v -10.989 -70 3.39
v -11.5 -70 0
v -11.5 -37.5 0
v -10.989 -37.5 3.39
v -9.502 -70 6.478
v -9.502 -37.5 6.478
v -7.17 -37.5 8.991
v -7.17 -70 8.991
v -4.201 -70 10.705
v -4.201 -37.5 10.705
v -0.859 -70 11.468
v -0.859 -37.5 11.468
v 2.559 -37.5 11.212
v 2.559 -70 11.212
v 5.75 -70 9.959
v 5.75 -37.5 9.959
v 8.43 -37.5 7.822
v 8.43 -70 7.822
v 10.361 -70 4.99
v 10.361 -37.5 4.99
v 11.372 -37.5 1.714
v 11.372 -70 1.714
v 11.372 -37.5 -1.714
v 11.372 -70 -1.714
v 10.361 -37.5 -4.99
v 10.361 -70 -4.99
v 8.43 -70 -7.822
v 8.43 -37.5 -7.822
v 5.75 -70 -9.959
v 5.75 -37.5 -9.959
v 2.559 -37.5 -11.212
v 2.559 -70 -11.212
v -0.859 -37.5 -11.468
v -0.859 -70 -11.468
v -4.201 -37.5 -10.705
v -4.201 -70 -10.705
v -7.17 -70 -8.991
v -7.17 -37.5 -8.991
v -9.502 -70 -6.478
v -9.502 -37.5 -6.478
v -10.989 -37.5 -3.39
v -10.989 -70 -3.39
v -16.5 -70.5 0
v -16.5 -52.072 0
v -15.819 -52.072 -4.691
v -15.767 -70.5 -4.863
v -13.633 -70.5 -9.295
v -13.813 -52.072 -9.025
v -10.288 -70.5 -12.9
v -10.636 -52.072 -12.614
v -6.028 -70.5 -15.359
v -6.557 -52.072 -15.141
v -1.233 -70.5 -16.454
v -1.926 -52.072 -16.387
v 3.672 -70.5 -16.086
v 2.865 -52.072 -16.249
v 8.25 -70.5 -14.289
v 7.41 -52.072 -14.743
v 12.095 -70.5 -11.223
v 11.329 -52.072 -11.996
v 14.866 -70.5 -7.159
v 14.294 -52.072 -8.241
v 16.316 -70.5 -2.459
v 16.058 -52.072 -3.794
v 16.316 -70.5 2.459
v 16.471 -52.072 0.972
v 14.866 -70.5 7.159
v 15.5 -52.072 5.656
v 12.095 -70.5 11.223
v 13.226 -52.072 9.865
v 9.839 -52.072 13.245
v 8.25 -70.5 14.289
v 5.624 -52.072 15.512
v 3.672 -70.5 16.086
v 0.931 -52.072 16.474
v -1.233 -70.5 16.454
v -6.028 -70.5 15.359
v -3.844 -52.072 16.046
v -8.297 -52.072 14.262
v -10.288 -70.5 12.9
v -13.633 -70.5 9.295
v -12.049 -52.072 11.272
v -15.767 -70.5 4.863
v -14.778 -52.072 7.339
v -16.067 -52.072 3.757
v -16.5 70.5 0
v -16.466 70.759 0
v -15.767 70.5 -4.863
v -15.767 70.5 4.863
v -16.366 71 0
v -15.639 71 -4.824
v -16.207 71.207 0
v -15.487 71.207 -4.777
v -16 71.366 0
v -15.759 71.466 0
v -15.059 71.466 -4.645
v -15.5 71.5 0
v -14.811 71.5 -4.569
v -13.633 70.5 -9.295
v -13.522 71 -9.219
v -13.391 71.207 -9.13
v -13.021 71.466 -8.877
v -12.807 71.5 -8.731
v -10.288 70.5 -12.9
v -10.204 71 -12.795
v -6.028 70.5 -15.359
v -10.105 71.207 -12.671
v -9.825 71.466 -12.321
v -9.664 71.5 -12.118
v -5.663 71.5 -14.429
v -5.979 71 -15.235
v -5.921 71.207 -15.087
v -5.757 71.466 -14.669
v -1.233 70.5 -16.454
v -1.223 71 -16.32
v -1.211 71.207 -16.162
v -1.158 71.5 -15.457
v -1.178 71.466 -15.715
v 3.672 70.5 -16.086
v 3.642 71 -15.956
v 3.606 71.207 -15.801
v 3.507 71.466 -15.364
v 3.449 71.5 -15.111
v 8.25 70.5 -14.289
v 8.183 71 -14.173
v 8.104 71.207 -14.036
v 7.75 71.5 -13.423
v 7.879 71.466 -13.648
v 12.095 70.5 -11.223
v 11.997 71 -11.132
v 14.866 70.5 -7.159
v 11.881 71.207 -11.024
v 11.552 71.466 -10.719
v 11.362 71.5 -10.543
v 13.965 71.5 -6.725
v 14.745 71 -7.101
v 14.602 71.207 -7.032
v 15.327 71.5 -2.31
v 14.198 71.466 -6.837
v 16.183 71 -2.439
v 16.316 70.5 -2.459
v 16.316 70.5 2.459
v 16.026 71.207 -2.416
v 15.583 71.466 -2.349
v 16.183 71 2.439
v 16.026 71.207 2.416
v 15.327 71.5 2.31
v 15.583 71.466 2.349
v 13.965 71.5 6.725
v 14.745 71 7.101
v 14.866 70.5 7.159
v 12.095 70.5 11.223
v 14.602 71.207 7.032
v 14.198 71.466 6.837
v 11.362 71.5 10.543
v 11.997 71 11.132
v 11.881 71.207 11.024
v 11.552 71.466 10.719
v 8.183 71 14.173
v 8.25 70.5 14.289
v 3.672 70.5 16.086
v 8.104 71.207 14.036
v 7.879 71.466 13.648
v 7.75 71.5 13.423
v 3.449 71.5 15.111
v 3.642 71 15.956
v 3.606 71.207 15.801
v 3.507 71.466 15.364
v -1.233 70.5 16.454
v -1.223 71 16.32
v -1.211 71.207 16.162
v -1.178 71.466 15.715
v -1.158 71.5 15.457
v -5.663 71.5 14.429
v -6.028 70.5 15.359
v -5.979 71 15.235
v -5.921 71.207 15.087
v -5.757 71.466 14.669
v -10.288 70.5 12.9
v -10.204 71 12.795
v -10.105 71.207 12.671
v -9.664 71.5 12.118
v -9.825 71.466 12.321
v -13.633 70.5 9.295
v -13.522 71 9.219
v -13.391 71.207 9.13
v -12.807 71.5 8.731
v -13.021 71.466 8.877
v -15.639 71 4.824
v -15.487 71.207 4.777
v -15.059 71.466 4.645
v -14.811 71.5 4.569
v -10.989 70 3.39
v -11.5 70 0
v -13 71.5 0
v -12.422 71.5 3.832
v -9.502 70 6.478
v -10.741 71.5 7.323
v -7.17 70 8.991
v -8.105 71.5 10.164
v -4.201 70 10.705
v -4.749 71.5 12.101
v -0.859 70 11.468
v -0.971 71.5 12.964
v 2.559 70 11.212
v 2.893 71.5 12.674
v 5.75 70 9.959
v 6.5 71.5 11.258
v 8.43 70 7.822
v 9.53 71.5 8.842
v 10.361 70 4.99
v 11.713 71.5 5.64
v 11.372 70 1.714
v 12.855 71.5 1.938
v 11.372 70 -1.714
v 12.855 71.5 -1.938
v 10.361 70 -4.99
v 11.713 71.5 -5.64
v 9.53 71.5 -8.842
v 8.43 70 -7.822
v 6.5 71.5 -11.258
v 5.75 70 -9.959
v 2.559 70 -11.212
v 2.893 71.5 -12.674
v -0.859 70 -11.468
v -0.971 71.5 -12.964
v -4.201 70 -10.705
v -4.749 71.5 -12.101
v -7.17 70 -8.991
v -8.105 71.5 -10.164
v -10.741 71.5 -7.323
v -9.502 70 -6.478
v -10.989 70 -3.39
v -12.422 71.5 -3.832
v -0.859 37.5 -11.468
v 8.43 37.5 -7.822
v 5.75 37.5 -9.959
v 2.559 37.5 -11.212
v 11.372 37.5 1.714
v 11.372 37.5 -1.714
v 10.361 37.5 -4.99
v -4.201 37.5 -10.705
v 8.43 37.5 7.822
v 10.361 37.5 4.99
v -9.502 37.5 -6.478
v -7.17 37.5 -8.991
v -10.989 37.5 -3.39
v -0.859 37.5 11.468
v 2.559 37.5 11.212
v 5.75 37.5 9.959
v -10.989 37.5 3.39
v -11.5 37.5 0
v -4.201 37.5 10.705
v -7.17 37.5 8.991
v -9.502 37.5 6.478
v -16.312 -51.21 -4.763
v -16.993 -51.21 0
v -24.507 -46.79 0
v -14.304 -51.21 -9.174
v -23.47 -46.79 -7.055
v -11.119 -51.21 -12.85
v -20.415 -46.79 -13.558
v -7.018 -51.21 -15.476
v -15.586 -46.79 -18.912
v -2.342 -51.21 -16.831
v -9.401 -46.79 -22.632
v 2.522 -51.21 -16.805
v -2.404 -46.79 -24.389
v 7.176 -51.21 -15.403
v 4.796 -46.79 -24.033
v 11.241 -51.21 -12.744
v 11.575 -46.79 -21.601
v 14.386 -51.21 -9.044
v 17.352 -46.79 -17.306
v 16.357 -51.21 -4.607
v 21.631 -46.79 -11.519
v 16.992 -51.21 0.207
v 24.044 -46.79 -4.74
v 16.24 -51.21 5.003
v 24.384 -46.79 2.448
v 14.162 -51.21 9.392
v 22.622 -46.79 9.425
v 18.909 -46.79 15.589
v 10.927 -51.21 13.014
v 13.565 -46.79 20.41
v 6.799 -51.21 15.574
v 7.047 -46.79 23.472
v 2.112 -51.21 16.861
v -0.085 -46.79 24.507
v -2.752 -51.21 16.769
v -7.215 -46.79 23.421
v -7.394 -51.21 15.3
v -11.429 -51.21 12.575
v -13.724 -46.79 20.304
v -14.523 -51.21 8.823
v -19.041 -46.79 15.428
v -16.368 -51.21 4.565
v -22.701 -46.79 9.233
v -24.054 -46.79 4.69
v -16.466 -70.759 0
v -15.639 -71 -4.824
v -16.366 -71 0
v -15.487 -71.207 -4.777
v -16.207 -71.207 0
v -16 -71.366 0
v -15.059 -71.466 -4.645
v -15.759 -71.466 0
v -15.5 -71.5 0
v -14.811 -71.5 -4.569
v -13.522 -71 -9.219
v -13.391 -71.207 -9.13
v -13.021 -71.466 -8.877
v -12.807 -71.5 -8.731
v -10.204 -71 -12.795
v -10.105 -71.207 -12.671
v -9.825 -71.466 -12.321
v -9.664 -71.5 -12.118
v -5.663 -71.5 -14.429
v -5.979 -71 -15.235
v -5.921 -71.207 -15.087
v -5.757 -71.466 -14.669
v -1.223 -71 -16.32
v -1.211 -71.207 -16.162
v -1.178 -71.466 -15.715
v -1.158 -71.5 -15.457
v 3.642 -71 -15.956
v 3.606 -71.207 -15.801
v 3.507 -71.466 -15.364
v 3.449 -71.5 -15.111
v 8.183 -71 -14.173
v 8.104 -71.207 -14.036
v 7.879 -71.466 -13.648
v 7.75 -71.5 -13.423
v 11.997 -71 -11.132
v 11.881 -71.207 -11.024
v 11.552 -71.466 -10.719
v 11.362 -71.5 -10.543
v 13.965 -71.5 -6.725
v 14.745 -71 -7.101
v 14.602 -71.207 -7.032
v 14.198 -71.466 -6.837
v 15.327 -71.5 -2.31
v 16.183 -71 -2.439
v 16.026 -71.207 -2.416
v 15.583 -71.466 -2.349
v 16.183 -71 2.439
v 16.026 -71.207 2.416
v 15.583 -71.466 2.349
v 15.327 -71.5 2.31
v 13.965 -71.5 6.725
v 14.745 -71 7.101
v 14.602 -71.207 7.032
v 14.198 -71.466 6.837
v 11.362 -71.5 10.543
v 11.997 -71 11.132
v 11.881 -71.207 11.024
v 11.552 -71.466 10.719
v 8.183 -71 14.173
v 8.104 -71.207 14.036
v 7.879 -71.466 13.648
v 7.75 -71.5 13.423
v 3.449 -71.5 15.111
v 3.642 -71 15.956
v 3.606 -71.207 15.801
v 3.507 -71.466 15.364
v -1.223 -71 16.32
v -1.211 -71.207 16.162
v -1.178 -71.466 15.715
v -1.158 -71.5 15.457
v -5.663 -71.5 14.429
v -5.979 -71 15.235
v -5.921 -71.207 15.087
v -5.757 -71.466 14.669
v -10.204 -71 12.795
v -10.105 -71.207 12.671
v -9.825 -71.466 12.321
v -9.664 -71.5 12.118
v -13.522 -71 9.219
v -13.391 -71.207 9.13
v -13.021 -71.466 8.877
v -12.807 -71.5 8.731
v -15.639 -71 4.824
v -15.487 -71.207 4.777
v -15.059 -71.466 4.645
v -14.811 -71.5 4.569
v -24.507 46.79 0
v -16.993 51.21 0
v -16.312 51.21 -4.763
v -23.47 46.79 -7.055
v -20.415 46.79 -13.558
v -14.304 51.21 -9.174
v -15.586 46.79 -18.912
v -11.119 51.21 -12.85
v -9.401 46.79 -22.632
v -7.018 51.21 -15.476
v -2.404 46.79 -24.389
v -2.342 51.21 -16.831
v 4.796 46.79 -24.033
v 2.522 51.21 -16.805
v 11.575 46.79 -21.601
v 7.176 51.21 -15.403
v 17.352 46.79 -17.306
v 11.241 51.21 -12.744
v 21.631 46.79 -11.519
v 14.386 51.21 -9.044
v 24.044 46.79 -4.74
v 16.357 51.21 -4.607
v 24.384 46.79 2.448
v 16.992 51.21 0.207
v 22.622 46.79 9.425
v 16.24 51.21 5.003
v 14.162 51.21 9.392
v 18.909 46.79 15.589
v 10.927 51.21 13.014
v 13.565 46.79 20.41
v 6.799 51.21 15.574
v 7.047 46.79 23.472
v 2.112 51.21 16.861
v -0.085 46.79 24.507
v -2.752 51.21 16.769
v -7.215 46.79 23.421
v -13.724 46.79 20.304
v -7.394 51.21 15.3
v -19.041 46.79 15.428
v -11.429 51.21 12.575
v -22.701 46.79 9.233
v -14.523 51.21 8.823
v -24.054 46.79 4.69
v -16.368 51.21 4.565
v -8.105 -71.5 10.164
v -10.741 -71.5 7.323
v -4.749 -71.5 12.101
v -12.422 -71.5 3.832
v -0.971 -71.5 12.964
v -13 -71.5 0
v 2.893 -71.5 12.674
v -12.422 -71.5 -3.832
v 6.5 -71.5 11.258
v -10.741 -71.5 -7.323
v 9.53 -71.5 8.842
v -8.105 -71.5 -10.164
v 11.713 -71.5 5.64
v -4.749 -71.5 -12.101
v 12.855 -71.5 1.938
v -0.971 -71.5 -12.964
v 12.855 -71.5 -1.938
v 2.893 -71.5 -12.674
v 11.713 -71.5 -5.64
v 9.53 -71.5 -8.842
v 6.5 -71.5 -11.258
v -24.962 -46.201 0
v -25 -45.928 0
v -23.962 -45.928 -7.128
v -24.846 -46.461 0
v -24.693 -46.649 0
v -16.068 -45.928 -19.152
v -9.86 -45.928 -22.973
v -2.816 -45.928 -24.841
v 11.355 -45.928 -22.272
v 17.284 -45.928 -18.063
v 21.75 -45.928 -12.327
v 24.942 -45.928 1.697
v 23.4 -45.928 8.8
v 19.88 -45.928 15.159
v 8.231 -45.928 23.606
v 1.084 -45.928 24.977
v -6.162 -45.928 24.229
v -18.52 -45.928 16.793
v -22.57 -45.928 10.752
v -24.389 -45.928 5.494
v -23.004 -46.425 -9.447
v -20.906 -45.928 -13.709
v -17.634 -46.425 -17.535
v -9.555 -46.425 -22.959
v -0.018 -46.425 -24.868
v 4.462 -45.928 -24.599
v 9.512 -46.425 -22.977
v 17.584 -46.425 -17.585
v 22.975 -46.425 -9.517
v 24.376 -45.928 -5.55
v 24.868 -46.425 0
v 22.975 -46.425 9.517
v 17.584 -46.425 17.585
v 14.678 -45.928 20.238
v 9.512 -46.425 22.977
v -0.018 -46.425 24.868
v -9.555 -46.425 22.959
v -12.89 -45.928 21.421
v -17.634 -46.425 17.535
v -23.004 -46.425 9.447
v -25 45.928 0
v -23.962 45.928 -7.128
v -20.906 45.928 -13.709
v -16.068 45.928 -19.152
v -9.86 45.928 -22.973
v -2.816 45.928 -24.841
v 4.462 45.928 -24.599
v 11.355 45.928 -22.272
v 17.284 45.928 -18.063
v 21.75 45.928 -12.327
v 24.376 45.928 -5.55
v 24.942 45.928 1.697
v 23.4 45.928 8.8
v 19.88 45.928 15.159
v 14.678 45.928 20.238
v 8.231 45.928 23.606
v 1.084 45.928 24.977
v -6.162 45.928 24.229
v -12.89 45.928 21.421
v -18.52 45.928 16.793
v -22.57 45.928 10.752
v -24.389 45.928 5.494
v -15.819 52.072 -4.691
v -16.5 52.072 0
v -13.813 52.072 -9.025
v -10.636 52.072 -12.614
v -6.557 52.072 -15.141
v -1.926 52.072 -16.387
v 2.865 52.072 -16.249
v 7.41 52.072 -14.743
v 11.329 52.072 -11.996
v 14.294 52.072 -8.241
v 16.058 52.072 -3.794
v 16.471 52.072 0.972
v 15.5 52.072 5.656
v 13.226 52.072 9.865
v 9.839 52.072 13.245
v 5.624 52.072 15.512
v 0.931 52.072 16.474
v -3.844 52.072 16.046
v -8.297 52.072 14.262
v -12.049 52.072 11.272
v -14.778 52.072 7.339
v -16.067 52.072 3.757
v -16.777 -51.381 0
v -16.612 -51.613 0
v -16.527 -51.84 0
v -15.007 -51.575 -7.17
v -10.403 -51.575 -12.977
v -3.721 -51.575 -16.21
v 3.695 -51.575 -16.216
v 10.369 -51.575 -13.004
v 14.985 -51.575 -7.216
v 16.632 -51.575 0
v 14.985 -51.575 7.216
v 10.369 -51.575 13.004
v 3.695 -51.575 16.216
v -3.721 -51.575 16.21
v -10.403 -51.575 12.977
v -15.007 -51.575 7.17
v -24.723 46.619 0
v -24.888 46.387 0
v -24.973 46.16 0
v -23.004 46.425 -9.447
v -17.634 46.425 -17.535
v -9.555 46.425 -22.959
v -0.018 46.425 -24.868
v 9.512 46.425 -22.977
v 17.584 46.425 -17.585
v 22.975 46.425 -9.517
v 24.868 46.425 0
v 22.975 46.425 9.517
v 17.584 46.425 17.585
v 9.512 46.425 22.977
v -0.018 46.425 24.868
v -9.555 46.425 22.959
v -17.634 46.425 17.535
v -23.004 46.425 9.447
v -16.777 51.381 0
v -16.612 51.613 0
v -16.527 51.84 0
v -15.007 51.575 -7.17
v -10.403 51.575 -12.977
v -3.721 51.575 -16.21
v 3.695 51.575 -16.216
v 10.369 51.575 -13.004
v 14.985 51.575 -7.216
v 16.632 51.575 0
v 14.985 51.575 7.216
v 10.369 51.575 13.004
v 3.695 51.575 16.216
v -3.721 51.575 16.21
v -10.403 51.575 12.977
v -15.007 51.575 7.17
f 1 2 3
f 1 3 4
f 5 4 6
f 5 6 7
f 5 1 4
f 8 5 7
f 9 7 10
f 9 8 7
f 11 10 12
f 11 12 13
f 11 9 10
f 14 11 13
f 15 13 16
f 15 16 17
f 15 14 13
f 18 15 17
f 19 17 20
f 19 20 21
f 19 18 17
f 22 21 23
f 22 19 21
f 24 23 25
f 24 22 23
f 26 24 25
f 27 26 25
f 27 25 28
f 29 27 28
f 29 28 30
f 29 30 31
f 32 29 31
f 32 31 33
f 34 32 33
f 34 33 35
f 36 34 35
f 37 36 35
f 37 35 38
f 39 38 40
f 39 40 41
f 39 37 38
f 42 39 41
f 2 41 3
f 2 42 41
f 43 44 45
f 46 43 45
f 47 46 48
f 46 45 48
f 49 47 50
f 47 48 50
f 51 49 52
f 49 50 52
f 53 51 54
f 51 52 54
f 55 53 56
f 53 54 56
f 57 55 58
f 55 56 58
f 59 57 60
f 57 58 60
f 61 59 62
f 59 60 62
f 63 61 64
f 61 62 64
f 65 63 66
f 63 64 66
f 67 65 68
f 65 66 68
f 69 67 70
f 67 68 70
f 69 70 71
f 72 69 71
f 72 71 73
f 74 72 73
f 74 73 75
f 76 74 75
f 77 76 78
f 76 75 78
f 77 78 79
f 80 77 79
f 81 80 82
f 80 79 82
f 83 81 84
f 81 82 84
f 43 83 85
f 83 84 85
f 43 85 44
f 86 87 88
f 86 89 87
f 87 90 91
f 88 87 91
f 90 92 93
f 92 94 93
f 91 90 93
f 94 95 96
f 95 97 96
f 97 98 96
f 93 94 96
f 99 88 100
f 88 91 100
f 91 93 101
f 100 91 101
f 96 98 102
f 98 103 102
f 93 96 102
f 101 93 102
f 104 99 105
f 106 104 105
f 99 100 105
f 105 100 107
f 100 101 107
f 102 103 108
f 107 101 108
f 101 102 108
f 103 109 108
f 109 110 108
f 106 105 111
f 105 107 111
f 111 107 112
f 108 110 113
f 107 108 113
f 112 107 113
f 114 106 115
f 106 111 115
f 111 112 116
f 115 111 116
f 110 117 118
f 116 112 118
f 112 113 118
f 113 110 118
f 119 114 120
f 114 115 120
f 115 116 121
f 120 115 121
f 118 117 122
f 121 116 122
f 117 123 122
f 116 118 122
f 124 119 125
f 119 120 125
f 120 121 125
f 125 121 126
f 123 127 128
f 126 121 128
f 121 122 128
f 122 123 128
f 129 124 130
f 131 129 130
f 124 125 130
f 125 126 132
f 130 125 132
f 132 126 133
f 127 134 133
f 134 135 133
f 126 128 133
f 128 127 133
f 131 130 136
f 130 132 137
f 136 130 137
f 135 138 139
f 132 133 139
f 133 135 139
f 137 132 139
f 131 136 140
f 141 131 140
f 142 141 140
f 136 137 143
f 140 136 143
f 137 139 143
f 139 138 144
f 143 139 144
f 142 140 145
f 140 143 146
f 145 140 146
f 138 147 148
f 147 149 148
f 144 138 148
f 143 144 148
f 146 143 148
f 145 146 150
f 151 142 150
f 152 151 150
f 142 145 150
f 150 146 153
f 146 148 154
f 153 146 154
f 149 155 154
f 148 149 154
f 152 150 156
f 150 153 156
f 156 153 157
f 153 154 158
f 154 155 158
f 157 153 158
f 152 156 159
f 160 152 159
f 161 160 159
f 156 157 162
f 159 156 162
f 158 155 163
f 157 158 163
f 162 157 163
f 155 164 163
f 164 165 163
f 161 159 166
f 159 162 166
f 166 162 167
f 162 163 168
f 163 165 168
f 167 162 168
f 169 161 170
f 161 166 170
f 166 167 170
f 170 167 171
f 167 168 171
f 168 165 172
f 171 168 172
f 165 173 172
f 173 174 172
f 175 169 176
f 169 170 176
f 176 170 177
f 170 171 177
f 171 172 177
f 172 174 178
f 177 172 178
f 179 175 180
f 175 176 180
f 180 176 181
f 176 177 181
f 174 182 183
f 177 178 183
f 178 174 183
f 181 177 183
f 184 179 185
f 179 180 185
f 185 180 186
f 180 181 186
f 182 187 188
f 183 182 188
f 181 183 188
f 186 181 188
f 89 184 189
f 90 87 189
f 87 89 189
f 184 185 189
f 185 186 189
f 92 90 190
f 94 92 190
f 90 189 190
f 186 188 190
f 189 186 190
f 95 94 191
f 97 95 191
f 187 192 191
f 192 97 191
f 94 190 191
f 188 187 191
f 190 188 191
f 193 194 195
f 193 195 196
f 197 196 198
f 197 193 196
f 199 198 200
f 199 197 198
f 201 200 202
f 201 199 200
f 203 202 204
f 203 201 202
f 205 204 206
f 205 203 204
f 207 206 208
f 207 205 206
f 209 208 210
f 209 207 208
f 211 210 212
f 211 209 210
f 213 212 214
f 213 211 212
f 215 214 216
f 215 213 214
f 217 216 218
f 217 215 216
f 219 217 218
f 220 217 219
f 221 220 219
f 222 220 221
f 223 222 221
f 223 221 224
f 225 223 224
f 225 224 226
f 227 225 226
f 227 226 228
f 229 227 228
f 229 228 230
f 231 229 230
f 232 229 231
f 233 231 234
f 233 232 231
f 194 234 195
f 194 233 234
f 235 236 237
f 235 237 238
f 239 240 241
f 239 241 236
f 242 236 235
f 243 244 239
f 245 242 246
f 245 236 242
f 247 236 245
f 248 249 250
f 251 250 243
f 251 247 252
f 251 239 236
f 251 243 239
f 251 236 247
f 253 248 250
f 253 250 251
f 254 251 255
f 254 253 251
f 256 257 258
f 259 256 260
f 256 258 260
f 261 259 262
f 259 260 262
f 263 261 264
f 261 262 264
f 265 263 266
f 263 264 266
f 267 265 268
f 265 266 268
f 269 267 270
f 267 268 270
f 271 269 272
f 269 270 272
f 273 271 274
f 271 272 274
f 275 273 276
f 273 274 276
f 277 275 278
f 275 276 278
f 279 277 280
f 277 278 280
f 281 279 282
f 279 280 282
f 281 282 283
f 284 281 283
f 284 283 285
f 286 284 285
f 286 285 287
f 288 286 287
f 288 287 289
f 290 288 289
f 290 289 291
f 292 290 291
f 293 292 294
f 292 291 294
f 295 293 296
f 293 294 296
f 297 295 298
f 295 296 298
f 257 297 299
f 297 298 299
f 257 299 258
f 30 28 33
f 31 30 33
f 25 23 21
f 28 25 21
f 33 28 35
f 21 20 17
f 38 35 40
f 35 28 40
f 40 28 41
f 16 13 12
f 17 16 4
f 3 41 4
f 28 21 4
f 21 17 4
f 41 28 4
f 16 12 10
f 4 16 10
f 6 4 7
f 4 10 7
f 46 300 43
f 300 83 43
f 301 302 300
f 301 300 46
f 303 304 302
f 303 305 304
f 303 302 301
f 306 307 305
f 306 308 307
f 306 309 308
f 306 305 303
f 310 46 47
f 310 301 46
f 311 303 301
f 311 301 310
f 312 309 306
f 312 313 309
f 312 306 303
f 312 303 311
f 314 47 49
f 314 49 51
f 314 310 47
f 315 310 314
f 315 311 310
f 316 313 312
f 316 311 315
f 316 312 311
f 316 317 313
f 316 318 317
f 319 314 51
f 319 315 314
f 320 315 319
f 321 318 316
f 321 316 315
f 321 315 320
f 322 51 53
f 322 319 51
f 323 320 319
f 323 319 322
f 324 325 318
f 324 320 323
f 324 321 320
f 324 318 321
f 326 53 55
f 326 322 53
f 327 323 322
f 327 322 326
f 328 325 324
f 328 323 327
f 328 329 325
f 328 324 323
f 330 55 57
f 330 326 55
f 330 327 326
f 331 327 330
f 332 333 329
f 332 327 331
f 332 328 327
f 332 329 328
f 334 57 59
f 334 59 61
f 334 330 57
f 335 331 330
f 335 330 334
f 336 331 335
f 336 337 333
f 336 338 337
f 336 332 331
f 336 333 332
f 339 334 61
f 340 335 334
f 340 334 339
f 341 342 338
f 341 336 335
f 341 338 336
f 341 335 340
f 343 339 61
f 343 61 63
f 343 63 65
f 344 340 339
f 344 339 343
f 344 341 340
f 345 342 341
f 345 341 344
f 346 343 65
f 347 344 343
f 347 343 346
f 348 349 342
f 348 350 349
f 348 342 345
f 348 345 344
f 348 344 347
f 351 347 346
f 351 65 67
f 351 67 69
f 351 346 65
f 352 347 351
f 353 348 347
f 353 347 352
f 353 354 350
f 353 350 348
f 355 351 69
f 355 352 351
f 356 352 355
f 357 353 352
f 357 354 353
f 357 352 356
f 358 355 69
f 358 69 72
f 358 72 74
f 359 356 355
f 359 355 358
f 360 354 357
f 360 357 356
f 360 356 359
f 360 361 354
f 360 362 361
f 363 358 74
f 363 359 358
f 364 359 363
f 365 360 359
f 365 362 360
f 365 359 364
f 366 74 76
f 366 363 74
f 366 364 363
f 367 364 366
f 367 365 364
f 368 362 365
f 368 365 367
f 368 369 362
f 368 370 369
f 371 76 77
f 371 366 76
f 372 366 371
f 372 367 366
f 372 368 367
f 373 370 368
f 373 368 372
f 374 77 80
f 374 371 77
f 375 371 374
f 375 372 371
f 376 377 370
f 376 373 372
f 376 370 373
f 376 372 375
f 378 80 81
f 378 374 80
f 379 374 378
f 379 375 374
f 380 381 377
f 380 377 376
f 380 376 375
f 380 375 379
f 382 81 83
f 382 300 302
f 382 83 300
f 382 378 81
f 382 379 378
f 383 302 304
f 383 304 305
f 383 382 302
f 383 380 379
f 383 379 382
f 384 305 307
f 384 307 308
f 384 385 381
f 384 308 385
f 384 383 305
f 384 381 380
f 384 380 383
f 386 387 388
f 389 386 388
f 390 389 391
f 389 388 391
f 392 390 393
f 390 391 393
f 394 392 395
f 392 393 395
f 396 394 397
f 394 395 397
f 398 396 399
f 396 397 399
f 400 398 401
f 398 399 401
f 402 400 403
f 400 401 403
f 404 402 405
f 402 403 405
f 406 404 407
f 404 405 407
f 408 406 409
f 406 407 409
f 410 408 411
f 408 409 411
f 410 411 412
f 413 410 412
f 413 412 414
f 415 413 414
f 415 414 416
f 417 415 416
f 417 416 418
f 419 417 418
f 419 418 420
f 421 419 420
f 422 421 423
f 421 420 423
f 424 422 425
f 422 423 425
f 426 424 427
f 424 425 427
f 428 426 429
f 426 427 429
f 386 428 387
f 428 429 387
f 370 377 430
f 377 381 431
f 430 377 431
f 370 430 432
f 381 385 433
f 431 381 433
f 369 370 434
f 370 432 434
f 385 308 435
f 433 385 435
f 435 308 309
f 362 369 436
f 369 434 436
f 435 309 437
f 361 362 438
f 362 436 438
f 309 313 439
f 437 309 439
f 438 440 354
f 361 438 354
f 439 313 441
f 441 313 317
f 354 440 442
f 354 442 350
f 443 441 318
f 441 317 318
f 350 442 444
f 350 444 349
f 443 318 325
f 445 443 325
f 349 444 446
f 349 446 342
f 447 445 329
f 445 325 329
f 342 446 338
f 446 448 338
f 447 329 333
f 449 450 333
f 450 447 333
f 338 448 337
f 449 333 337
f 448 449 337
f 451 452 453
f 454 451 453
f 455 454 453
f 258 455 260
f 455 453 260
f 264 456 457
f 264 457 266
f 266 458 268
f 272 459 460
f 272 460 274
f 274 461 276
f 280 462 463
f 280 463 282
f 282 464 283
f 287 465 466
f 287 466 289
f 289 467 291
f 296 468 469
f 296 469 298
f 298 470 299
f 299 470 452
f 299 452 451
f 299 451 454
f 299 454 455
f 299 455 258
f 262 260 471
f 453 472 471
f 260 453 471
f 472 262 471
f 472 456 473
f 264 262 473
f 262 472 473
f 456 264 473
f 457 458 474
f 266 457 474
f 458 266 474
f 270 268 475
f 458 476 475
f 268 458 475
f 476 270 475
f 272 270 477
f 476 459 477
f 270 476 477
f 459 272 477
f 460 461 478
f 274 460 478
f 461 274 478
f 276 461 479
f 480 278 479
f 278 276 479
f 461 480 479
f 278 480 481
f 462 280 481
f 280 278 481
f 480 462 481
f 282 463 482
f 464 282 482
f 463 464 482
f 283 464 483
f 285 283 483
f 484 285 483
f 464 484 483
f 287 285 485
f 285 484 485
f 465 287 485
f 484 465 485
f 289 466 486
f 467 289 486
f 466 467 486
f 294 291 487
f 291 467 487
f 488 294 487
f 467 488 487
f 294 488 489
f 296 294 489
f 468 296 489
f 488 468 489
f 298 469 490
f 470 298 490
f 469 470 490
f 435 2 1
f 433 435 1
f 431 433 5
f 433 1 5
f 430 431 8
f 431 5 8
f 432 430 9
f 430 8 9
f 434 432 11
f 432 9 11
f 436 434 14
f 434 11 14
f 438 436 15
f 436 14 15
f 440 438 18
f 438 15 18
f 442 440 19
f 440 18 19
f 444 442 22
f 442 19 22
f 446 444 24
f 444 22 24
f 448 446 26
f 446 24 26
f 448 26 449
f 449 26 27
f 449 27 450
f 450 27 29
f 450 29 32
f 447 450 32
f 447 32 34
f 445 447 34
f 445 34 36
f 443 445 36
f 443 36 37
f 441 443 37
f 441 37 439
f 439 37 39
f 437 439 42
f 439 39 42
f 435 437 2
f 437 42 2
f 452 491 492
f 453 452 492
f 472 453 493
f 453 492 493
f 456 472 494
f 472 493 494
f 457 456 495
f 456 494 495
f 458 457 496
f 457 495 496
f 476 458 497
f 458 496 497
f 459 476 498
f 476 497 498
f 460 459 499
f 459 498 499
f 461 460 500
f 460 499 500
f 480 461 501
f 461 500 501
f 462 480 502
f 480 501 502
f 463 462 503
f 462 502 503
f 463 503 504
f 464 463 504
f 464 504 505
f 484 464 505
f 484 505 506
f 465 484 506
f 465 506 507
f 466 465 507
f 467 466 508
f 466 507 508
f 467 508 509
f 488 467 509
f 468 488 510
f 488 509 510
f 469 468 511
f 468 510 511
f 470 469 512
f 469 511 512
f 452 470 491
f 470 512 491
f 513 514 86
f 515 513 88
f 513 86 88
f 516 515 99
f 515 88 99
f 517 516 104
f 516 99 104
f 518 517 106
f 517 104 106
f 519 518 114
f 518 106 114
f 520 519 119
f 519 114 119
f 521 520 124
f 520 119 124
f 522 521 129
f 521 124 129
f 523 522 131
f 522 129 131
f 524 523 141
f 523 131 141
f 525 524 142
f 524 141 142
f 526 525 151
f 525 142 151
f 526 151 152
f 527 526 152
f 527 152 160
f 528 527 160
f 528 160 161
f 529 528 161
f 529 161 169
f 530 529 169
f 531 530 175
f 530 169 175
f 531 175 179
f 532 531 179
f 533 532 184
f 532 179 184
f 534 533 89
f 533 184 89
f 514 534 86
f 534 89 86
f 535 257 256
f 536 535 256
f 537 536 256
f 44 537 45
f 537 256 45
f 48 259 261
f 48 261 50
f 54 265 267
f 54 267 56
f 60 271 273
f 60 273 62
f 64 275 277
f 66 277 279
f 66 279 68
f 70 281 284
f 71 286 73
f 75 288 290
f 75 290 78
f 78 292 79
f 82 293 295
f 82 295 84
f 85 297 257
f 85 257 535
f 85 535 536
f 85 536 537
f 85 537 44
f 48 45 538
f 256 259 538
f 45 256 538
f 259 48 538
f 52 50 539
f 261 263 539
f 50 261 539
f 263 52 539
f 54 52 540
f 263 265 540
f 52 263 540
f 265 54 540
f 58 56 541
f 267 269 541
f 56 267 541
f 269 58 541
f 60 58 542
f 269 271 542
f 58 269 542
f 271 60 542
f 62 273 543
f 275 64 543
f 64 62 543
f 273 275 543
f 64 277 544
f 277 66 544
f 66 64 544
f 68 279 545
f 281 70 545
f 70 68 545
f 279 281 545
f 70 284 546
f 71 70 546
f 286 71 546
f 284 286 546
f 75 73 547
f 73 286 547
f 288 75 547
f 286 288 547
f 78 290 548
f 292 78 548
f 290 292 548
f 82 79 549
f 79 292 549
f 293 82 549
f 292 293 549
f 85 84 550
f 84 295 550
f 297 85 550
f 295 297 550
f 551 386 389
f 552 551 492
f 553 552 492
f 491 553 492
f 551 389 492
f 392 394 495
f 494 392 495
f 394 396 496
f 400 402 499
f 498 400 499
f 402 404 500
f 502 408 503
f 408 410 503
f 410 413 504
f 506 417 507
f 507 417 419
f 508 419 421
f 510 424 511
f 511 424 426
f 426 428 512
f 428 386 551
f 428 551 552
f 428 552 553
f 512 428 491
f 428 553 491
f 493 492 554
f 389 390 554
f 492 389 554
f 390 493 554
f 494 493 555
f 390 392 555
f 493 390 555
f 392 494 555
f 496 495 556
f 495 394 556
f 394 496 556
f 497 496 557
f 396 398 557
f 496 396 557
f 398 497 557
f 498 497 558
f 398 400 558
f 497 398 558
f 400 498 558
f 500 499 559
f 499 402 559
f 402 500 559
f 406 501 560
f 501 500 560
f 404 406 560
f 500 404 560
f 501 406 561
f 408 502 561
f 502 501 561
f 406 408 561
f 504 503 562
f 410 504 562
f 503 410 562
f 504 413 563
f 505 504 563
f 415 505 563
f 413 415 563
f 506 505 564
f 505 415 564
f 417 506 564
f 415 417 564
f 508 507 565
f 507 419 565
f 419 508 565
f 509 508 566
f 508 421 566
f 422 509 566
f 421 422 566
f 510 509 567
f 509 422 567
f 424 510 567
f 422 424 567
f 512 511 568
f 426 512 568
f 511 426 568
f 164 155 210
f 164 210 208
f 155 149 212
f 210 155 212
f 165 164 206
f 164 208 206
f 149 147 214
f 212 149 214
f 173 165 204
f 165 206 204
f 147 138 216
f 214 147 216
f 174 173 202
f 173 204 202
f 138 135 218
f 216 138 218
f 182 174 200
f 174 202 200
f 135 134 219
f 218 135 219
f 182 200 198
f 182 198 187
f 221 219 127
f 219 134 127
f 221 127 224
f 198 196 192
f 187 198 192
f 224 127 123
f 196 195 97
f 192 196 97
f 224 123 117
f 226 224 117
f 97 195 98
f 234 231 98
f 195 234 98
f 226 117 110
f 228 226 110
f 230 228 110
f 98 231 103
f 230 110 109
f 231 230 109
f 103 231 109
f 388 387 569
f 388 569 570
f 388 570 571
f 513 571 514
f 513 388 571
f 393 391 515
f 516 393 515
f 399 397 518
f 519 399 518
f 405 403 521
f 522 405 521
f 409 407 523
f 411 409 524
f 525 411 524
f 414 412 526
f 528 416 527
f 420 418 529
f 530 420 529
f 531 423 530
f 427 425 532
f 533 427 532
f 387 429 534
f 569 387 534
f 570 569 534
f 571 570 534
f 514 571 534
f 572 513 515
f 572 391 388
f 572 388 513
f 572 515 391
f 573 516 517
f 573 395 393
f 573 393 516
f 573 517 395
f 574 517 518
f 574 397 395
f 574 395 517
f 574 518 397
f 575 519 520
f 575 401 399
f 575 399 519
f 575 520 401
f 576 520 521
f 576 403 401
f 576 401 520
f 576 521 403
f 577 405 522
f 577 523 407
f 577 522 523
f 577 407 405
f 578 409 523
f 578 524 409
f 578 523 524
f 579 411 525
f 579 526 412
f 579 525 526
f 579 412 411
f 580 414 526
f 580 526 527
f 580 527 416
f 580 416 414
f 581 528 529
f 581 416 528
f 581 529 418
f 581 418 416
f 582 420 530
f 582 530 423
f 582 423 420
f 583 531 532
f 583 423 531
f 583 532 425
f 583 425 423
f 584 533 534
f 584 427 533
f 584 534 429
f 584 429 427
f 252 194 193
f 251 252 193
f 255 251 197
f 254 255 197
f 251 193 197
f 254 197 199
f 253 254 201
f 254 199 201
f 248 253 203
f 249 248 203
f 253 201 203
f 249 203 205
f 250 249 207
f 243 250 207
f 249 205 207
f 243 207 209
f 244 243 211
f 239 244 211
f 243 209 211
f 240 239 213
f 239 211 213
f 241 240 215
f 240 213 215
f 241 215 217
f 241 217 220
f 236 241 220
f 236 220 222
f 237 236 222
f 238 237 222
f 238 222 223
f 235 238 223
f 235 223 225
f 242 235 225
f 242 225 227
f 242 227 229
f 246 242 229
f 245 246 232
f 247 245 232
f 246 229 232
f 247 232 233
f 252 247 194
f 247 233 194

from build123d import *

# Parameters (mm, degrees)
SKETCH2_R          = 11.5
CUT_EXTRUDE1_DEPTH = 34
FILLET1_R          = 1
FILLET2_R          = 1
FILLET3_R          = 1
FILLET5_R          = 1
CHAMFER1_SIZE      = 1.5


with BuildPart() as part:
    # Sketch1 → Revolve2 (revolve)
    with BuildSketch(Plane.XY, mode=Mode.PRIVATE) as revolve2_sk:
        Polygon((16.5, 71.5), (0, 71.5), (0, 0), (25, 0), (25, 46.5), (16.5, 51.5), align=None)
        Polygon((25, 0), (0, 0), (0, -71.5), (16.5, -71.5), (16.5, -51.5), (25, -46.5), align=None)
    revolve(revolve2_sk.sketch.rotate(Axis((0, 71.5, 0), (0, -1, 0)), 180), axis=Axis((0, 71.5, 0), (0, -1, 0)))

    # Sketch2 → Cut-Extrude1 (cut)
    with BuildSketch(Plane(origin=(0, 71.5, 0), x_dir=(1, 0, 0), z_dir=(0, 1, 0))):
        with Locations(Location((0, 0, 0), (0, 0, 180))):
            Circle(SKETCH2_R)
    cut_extrude1 = extrude(amount=-CUT_EXTRUDE1_DEPTH, mode=Mode.SUBTRACT)

    # Mirror1: Cut-Extrude1 across plane
    add(cut_extrude1.mirror(Plane.ZX), mode=Mode.SUBTRACT)

    # Fillet1
    fillet1_edges = [part.edges().sort_by_distance(p)[0] for p in [
        (25, 46.5, 0),
    ]]
    fillet(fillet1_edges, radius=FILLET1_R)

    # Fillet2
    fillet2_edges = [part.edges().sort_by_distance(p)[0] for p in [
        (16.5, 51.5, 0),
    ]]
    fillet(fillet2_edges, radius=FILLET2_R)

    # Fillet3
    fillet3_edges = [part.edges().sort_by_distance(p)[0] for p in [
        (25, -46.5, 0),
        (16.5, -51.5, 0),
    ]]
    fillet(fillet3_edges, radius=FILLET3_R)

    # Fillet5
    fillet5_edges = [part.edges().sort_by_distance(p)[0] for p in [
        (16.5, 71.5, 0),
        (16.5, -71.5, 0),
    ]]
    fillet(fillet5_edges, radius=FILLET5_R)

    # Chamfer1
    chamfer1_edges = [part.edges().sort_by_distance(p)[0] for p in [
        (11.5, 71.5, 0),
        (11.5, -71.5, 0),
    ]]
    chamfer(chamfer1_edges, length=CHAMFER1_SIZE)


solid = part.part
